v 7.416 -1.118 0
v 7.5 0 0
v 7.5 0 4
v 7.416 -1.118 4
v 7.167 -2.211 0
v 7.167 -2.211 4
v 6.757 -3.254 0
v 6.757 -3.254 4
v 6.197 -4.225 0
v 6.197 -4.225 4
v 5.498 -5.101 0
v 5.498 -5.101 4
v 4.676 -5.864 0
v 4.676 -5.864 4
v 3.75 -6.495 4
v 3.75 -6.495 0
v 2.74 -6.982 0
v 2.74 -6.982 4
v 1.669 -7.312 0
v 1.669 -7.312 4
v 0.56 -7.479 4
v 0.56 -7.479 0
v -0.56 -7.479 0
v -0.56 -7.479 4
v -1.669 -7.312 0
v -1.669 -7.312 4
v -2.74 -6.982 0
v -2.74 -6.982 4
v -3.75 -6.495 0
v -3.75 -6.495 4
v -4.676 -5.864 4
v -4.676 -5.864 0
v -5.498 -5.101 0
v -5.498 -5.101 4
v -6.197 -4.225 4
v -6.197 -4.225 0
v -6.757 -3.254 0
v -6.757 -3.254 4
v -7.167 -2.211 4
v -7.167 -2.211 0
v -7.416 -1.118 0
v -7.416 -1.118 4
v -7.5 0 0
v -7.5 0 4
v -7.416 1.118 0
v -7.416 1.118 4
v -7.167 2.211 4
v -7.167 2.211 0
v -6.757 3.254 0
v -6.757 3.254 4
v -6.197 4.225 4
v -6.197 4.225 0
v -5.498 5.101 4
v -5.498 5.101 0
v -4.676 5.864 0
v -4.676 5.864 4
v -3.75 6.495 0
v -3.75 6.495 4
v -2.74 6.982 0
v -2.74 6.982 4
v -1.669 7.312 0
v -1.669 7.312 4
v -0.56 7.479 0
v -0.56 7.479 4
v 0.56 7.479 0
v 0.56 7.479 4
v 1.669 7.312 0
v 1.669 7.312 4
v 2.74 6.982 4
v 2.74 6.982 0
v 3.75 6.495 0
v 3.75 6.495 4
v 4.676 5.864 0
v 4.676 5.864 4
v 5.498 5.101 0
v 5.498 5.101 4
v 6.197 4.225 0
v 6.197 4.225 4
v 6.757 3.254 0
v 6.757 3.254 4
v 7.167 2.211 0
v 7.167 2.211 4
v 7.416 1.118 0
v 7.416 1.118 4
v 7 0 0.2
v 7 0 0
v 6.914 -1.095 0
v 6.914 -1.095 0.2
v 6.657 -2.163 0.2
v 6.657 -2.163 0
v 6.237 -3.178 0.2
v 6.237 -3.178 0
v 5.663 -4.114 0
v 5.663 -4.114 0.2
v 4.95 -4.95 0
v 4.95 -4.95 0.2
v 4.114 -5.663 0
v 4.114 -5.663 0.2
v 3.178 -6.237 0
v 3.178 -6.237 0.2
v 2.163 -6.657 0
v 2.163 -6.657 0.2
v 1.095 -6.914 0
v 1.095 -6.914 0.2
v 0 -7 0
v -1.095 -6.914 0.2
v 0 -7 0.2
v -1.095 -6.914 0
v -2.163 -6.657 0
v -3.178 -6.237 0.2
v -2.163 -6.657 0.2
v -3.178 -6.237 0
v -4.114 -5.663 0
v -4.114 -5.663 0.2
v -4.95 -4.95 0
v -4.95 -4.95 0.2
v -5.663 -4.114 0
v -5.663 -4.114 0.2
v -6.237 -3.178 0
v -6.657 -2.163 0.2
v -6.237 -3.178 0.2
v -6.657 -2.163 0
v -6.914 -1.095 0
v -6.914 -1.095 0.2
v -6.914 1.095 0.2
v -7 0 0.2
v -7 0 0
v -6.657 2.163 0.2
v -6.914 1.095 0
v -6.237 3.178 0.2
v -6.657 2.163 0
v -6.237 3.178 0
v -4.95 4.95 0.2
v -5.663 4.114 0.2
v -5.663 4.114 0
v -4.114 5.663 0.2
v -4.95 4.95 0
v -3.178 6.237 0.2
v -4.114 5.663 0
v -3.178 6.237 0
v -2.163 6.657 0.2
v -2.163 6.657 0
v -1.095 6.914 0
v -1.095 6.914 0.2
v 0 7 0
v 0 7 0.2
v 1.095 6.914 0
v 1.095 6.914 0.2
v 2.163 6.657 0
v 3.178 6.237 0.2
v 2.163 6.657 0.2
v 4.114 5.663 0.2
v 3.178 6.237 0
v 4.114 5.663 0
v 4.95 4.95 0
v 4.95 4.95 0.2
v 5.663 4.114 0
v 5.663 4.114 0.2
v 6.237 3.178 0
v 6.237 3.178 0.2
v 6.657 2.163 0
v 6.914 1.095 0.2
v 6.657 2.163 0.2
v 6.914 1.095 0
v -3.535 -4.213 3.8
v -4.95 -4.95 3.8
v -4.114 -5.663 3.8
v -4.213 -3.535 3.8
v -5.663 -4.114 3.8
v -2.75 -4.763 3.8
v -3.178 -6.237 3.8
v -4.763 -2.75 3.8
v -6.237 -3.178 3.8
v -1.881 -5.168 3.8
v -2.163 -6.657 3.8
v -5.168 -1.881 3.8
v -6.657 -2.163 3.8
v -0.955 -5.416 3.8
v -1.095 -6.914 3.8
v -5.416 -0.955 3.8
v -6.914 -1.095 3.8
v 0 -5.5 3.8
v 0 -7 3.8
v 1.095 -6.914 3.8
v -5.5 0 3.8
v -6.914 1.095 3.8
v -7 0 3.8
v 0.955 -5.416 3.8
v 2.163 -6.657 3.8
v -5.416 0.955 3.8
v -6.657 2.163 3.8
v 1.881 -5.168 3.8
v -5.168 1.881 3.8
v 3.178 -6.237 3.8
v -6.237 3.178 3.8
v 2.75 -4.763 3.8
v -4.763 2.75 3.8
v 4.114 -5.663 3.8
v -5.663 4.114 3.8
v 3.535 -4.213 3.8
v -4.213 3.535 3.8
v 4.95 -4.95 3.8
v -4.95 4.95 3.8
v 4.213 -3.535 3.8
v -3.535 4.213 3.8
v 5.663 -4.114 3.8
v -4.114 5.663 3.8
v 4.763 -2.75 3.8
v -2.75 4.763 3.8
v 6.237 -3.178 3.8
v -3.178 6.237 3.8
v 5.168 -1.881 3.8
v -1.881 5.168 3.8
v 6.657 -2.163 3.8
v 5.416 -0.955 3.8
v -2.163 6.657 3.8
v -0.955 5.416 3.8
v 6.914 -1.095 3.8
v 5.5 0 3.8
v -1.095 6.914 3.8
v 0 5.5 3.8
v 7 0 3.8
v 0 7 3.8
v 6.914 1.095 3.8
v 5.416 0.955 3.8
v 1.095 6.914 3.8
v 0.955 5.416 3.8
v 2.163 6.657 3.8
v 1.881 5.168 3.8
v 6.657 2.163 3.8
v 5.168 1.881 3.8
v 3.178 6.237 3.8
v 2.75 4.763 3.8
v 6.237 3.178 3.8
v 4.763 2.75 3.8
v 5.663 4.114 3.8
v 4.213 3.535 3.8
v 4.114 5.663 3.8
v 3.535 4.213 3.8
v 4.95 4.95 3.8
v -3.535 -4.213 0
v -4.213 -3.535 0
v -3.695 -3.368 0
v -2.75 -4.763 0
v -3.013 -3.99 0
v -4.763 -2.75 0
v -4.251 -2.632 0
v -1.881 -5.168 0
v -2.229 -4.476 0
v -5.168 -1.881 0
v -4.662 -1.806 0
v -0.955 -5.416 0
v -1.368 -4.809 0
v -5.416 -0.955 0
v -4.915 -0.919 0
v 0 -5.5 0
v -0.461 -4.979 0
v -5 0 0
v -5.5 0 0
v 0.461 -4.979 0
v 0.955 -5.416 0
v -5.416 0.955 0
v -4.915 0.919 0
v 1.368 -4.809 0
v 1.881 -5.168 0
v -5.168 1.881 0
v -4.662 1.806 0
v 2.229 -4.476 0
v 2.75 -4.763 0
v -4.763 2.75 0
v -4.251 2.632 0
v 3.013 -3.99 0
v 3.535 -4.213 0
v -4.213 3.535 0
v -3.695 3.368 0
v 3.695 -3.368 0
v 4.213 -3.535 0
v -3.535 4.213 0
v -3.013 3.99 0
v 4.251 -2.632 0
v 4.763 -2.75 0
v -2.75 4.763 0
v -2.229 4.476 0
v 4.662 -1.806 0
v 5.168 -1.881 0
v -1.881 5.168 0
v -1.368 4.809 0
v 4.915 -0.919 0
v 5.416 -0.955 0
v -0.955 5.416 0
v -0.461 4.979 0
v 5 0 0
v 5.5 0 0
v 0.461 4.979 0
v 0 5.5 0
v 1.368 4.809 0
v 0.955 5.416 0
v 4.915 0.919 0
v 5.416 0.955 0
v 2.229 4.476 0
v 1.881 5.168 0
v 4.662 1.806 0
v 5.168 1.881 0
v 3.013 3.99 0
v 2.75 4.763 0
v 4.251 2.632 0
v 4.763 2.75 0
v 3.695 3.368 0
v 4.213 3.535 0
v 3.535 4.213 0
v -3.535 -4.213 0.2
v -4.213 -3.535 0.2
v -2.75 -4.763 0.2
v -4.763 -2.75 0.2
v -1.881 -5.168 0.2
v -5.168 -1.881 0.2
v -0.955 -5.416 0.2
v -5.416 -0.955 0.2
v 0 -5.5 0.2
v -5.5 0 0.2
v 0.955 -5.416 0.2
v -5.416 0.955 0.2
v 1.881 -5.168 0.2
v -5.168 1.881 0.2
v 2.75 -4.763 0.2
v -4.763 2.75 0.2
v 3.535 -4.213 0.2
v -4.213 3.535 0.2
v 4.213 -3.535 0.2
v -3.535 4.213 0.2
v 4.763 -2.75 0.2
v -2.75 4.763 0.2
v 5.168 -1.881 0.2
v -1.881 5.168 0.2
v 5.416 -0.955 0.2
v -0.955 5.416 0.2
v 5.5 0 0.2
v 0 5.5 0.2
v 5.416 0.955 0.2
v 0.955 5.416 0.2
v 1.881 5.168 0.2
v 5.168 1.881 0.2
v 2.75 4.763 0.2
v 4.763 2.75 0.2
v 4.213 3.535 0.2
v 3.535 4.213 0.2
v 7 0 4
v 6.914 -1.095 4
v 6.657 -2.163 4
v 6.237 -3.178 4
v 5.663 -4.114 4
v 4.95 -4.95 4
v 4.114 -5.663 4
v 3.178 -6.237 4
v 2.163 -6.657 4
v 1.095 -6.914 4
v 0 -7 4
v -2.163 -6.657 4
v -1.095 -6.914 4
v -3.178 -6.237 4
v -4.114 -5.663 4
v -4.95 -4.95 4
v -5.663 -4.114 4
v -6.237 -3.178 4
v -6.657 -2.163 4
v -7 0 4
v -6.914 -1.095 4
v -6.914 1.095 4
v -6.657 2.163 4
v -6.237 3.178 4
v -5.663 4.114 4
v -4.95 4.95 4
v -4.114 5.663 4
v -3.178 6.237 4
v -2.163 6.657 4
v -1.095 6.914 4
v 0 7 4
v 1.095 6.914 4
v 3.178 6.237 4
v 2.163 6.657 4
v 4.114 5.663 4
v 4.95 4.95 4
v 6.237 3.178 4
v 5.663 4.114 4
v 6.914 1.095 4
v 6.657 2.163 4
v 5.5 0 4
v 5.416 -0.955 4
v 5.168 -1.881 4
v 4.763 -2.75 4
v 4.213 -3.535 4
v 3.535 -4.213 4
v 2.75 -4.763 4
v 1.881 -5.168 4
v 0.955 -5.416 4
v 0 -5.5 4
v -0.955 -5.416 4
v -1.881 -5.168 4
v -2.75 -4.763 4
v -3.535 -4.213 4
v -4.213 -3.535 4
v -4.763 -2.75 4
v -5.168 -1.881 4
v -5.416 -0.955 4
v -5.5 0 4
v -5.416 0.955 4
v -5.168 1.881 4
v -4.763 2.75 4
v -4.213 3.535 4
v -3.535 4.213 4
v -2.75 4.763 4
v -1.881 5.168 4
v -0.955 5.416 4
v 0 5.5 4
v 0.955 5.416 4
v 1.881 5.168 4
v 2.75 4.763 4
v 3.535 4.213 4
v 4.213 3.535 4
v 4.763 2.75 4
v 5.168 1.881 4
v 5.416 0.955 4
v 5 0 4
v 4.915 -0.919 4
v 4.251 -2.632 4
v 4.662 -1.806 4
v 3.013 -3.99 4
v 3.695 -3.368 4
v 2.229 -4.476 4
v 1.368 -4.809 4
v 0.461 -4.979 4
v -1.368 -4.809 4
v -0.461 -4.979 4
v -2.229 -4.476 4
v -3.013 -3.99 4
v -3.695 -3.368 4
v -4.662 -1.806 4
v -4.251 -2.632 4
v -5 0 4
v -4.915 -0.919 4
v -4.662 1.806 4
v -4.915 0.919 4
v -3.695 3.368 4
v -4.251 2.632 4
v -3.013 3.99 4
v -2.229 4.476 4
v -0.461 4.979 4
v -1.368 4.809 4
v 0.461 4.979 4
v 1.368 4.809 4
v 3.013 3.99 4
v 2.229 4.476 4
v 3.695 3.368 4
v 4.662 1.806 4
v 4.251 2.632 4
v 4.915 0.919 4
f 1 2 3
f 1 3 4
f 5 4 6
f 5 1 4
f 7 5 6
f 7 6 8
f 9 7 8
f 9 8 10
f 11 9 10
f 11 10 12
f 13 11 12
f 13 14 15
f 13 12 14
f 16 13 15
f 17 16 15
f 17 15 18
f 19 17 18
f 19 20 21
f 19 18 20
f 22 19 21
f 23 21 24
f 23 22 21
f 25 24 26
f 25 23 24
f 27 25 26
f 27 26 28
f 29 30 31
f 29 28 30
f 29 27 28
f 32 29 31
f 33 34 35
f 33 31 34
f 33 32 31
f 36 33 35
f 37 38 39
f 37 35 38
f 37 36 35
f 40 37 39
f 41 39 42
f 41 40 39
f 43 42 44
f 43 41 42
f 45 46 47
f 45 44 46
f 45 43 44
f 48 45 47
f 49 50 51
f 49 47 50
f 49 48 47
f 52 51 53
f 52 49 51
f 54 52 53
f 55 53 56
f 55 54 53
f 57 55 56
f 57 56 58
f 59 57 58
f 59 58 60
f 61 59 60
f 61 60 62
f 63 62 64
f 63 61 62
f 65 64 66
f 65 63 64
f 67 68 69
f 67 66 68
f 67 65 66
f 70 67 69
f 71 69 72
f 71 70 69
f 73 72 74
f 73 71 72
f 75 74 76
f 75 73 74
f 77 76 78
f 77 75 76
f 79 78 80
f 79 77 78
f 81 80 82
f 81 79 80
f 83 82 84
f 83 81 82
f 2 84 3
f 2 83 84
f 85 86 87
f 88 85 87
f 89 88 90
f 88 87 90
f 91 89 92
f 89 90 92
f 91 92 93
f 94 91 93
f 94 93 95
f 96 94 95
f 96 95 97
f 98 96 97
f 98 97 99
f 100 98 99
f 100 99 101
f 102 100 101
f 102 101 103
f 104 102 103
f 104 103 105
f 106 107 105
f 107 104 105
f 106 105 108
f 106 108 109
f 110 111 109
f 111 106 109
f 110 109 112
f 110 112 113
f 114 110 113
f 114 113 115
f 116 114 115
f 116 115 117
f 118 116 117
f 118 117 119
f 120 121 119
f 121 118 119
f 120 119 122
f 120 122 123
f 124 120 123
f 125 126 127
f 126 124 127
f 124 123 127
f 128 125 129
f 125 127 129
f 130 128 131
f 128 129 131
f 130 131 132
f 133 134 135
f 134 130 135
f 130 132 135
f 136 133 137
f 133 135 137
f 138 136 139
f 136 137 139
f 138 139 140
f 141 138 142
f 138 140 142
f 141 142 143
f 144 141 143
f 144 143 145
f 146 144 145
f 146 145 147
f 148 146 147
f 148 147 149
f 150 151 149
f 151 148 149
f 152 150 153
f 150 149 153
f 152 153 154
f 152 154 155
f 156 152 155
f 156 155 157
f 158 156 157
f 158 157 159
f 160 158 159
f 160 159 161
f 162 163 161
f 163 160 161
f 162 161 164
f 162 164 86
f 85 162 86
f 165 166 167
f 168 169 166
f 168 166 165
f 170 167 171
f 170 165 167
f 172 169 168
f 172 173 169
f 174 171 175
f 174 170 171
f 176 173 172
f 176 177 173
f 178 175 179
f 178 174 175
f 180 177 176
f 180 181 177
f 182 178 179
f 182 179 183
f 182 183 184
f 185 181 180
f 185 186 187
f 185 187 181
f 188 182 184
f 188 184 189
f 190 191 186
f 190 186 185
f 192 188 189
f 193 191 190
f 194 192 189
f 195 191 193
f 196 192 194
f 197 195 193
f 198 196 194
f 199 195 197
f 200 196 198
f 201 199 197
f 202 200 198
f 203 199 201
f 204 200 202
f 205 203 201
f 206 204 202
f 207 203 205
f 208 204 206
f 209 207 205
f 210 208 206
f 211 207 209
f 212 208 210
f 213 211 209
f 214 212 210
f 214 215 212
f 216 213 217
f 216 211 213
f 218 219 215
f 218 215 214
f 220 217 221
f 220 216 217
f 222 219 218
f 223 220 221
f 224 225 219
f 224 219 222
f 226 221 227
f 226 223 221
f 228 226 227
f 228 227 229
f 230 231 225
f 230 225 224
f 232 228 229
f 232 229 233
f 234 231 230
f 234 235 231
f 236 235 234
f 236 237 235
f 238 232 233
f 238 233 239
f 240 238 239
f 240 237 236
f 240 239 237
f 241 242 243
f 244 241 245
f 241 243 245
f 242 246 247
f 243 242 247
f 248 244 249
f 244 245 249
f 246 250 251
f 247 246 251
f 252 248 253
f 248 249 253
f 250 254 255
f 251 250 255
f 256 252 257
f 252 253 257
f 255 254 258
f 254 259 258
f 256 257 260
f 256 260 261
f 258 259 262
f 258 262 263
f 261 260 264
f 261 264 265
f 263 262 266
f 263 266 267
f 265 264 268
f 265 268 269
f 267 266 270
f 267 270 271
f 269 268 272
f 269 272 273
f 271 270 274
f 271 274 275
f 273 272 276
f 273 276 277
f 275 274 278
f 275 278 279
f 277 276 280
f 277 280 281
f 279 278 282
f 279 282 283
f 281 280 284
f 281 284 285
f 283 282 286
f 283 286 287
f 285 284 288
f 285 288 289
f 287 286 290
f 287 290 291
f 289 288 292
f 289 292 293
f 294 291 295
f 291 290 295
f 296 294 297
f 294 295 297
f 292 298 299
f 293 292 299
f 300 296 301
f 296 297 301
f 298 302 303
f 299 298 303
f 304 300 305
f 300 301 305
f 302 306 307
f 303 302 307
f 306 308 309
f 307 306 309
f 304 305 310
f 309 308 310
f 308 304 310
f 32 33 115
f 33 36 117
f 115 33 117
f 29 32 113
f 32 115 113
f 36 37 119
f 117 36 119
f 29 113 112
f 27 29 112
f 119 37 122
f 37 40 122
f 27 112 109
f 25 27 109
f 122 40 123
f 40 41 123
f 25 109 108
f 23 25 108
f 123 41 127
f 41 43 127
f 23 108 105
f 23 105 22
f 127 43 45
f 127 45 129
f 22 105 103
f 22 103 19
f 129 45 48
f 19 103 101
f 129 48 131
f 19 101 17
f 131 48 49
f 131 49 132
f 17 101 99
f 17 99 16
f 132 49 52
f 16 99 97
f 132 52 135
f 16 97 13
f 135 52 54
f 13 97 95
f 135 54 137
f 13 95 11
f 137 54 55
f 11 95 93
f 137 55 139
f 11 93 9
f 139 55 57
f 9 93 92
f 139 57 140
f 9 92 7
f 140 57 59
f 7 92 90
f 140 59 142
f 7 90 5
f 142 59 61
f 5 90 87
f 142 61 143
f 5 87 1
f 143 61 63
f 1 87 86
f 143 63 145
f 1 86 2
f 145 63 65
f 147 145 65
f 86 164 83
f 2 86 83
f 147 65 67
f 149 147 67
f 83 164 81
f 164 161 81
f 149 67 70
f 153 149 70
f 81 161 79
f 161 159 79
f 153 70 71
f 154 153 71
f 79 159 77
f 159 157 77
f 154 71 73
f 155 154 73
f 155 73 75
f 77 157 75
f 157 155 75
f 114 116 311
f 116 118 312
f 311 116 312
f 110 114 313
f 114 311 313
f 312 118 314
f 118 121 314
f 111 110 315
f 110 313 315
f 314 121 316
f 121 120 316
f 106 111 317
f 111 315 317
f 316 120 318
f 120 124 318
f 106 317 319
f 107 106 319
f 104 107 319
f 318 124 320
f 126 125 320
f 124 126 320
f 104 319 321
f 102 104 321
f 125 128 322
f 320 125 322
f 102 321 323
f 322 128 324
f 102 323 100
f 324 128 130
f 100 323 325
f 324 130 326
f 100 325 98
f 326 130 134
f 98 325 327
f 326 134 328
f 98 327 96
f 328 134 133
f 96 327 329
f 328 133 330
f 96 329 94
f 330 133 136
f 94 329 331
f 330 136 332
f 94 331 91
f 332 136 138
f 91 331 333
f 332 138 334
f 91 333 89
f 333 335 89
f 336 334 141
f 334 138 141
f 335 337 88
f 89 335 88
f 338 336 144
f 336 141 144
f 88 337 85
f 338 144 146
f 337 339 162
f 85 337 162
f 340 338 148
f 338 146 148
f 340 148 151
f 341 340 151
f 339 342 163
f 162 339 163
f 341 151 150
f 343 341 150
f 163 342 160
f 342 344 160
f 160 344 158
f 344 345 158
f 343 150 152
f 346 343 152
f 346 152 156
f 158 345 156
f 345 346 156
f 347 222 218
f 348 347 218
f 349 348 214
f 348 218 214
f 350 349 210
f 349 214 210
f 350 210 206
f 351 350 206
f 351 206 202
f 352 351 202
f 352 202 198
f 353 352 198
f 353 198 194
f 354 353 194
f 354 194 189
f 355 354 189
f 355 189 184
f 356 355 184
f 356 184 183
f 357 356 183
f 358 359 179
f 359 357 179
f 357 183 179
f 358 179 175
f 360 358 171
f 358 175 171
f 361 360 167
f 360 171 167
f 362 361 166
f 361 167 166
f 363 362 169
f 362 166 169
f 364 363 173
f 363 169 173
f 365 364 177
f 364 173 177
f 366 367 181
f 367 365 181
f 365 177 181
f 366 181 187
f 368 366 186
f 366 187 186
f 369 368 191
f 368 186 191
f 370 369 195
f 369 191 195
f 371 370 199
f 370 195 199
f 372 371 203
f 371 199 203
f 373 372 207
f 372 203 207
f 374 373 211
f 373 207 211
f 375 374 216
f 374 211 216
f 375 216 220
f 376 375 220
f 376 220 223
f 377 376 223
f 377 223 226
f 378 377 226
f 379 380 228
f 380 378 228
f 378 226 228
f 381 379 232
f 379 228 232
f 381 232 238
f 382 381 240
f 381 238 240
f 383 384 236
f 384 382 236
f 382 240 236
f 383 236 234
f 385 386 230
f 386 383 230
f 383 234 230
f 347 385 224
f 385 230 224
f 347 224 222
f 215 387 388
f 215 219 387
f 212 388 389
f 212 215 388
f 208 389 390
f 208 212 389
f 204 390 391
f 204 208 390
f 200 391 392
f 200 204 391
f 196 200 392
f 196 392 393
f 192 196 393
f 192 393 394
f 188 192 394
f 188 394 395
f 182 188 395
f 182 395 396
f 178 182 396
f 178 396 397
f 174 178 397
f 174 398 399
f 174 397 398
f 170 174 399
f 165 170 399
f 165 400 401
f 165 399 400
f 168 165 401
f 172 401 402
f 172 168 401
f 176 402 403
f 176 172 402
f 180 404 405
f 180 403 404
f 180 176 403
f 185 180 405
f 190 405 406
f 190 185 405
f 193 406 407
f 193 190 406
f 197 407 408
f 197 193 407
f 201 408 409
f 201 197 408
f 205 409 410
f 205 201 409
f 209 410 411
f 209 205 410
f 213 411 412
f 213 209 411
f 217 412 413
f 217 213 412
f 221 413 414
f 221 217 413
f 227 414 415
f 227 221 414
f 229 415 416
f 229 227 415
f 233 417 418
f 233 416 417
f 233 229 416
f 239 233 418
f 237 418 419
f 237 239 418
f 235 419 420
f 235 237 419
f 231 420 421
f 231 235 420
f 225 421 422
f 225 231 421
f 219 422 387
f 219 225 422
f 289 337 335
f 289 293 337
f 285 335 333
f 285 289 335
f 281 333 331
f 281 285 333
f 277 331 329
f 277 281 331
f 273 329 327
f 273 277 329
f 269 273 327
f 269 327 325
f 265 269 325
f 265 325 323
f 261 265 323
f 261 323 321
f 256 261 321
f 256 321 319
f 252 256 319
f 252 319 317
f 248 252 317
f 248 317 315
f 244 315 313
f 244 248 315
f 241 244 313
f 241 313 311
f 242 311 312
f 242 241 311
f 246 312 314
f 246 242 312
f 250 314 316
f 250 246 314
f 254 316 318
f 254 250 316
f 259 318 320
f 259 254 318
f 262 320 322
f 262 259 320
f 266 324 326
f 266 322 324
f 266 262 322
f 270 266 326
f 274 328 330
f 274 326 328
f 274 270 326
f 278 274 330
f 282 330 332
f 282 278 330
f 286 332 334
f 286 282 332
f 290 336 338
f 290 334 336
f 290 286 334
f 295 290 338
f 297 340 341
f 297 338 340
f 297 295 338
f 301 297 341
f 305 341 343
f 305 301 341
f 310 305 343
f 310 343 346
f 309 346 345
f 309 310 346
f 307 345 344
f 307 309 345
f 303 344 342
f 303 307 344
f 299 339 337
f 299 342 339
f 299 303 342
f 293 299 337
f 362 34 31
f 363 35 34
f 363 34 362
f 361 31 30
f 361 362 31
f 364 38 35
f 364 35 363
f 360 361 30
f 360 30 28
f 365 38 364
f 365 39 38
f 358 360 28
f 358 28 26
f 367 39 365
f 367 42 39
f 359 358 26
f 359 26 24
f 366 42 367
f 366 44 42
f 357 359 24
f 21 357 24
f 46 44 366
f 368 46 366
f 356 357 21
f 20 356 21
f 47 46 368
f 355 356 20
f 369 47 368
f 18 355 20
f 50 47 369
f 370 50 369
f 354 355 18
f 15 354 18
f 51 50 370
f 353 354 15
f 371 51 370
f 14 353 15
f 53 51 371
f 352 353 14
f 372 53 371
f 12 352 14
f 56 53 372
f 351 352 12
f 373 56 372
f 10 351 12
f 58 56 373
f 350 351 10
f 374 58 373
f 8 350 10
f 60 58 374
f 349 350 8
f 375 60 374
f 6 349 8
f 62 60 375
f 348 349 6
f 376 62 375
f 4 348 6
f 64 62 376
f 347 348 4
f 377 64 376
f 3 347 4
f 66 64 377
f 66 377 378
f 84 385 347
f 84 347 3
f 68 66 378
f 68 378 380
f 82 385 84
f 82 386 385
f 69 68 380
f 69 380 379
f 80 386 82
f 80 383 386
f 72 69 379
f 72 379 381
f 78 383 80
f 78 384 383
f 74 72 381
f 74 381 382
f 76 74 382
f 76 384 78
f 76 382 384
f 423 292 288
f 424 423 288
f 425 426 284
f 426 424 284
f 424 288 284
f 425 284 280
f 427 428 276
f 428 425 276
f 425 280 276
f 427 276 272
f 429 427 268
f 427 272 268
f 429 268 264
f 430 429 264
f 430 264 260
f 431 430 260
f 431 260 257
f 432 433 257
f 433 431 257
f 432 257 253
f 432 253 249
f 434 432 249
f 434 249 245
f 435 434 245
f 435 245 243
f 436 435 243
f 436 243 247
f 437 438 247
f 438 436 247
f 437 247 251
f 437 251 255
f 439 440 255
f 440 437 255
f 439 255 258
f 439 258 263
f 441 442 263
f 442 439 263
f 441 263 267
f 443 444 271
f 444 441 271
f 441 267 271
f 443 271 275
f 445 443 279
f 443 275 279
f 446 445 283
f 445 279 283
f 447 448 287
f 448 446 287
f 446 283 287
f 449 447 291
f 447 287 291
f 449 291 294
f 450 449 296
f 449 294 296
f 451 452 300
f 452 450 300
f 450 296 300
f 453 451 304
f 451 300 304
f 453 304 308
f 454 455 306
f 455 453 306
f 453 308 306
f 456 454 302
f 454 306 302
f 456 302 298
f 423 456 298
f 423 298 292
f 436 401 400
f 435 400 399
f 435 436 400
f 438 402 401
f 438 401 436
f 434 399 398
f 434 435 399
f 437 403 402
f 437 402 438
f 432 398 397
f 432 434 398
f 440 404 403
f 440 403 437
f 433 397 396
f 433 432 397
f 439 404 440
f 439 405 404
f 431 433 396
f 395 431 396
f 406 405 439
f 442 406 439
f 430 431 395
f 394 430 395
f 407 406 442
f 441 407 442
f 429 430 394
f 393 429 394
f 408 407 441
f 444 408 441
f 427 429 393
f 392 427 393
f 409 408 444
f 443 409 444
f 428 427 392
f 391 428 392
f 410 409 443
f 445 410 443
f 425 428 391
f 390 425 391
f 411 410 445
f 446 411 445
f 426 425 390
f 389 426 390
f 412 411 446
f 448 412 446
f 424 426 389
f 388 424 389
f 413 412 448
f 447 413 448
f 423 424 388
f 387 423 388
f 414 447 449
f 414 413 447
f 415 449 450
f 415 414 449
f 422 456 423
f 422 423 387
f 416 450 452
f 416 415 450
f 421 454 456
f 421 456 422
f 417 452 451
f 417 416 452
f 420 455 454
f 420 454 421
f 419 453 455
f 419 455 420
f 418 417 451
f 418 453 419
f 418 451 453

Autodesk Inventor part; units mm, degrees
ref_plane "YZ Plane" through (0, 0, 0) normal (1, 0, 0) x (0, 1, 0)
ref_plane "XZ Plane" through (0, 0, 0) normal (0, 1, 0) x (-1, 0, 0)
sketch "Sketch1" plane through (0, 0, 0) normal (0, 0, 1) x (1, 0, 0)
  circle A0 centre (0, 0) radius 7.5
  circle A1 centre (0, 0) radius 5
  circle A2 centre (0, 0) radius 5.5
  circle A3 centre (0, 0) radius 7
  dimension "d0" = 15
  dimension "d1" = 10
  dimension "d2" = 0.5
  dimension "d3" = 0.5
extrude "Extrusion1" add sketch "Sketch1" along normal blind 4
ref_plane "Work Plane1" through (0, 0, 0.2) normal (0, 0, 1) x (1, 0, 0)
sketch "Sketch2" plane through (0, 0, 0.2) normal (0, 0, 1) x (1, 0, 0)
  circle A0 centre (0, 0) radius 7 projected
  circle A1 centre (0, 0) radius 7.5 projected
  circle A2 centre (0, 0) radius 5 projected
  circle A3 centre (0, 0) radius 5.5 projected
extrude "Extrusion2" add sketch "Sketch2" along normal blind 3.6 contours A0
properties part number "15x10x4 bearing"
